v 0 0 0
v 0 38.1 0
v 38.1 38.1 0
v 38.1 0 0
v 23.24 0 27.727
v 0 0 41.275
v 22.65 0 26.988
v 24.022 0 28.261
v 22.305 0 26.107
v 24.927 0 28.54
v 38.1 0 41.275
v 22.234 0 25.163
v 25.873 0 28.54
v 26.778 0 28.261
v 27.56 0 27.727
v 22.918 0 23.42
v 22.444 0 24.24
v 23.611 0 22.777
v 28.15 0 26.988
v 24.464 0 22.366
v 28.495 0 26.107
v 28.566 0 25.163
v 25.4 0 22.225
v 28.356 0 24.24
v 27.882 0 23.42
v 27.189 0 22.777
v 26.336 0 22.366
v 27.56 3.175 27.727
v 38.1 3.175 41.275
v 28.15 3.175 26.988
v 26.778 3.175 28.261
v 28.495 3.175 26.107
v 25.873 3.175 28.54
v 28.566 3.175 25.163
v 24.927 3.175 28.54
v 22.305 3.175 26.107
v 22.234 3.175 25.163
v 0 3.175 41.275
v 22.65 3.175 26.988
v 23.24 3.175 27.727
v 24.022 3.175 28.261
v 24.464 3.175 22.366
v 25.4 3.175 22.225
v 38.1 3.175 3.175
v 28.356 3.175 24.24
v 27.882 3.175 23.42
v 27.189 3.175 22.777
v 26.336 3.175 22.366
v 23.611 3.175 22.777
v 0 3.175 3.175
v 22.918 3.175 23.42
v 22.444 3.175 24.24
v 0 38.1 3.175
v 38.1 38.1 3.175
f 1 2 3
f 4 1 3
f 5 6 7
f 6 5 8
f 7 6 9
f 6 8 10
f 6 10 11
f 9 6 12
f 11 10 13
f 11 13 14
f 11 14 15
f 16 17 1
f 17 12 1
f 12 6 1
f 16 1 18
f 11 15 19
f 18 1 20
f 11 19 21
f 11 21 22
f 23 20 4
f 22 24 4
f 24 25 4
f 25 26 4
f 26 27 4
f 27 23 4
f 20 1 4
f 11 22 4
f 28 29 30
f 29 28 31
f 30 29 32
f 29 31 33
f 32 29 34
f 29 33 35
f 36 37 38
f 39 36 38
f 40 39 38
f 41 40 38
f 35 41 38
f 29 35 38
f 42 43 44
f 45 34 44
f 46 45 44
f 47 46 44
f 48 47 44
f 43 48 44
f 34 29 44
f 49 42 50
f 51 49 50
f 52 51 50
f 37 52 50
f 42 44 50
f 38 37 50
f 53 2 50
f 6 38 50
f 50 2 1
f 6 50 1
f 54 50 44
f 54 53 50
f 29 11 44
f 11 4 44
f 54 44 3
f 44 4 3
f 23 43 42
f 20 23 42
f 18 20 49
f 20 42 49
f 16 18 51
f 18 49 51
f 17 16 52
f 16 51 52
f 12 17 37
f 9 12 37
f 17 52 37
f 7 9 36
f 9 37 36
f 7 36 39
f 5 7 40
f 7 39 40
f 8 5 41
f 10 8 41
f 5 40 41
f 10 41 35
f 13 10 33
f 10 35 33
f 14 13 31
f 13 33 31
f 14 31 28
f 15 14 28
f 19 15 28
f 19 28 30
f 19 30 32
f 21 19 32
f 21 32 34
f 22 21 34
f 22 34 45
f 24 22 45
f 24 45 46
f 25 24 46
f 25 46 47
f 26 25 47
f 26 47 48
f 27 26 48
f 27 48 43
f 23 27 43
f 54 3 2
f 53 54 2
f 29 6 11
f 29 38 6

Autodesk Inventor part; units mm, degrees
ref_plane "YZ Plane" through (0, 0, 0) normal (1, 0, 0) x (0, 1, 0)
ref_plane "XZ Plane" through (0, 0, 0) normal (0, 1, 0) x (-1, 0, 0)
ref_plane "XY Plane" through (0, 0, 0) normal (0, 0, 1) x (1, 0, 0)
sketch "Sketch1" plane through (0, 0, 0) normal (0, 0, 1) x (1, 0, 0)
  line L0 (0, 0) -> (38.1, 0)
  line L1 (38.1, 0) -> (38.1, 38.1)
  line L2 (38.1, 38.1) -> (0, 38.1)
  line L3 (0, 38.1) -> (0, 0)
  dimension "d0" = 38.1
  dimension "d1" = 38.1
extrude "Extrusion1" add sketch "Sketch1" along normal blind 3.175
sketch "Sketch2" plane through (0, 0, 3.175) normal (0, 0, 1) x (1, 0, 0)
  line L0 (0, 0) -> (38.1, 0) projected
  line L1 (38.1, 0) -> (38.1, 38.1) projected
  line L2 (0, 0) -> (38.1, 0)
  line L3 (38.1, 0) -> (38.1, 3.175)
  line L4 (38.1, 3.175) -> (0, 3.175)
  line L5 (0, 3.175) -> (0, 0)
  dimension "d4" = 3.175
extrude "Extrusion2" add sketch "Sketch2" along normal blind 38.1
sketch "Sketch3" plane through (0, 0, 0) normal (0, -1, 0) x (1, 0, 0)
  line L0 (0, 0) -> (38.1, 0) projected
  line L1 (0, 0) -> (0, 41.275) projected
  point P0 (25.4, 25.4)
  dimension "d7" = 25.4
  dimension "d8" = 25.4
hole "Hole1" at (25.4, 0, 25.4) direction (0, 1, 0) diameter 6.35 end through all
properties part number "CLB_064_ScissorOutsideLBraket"
